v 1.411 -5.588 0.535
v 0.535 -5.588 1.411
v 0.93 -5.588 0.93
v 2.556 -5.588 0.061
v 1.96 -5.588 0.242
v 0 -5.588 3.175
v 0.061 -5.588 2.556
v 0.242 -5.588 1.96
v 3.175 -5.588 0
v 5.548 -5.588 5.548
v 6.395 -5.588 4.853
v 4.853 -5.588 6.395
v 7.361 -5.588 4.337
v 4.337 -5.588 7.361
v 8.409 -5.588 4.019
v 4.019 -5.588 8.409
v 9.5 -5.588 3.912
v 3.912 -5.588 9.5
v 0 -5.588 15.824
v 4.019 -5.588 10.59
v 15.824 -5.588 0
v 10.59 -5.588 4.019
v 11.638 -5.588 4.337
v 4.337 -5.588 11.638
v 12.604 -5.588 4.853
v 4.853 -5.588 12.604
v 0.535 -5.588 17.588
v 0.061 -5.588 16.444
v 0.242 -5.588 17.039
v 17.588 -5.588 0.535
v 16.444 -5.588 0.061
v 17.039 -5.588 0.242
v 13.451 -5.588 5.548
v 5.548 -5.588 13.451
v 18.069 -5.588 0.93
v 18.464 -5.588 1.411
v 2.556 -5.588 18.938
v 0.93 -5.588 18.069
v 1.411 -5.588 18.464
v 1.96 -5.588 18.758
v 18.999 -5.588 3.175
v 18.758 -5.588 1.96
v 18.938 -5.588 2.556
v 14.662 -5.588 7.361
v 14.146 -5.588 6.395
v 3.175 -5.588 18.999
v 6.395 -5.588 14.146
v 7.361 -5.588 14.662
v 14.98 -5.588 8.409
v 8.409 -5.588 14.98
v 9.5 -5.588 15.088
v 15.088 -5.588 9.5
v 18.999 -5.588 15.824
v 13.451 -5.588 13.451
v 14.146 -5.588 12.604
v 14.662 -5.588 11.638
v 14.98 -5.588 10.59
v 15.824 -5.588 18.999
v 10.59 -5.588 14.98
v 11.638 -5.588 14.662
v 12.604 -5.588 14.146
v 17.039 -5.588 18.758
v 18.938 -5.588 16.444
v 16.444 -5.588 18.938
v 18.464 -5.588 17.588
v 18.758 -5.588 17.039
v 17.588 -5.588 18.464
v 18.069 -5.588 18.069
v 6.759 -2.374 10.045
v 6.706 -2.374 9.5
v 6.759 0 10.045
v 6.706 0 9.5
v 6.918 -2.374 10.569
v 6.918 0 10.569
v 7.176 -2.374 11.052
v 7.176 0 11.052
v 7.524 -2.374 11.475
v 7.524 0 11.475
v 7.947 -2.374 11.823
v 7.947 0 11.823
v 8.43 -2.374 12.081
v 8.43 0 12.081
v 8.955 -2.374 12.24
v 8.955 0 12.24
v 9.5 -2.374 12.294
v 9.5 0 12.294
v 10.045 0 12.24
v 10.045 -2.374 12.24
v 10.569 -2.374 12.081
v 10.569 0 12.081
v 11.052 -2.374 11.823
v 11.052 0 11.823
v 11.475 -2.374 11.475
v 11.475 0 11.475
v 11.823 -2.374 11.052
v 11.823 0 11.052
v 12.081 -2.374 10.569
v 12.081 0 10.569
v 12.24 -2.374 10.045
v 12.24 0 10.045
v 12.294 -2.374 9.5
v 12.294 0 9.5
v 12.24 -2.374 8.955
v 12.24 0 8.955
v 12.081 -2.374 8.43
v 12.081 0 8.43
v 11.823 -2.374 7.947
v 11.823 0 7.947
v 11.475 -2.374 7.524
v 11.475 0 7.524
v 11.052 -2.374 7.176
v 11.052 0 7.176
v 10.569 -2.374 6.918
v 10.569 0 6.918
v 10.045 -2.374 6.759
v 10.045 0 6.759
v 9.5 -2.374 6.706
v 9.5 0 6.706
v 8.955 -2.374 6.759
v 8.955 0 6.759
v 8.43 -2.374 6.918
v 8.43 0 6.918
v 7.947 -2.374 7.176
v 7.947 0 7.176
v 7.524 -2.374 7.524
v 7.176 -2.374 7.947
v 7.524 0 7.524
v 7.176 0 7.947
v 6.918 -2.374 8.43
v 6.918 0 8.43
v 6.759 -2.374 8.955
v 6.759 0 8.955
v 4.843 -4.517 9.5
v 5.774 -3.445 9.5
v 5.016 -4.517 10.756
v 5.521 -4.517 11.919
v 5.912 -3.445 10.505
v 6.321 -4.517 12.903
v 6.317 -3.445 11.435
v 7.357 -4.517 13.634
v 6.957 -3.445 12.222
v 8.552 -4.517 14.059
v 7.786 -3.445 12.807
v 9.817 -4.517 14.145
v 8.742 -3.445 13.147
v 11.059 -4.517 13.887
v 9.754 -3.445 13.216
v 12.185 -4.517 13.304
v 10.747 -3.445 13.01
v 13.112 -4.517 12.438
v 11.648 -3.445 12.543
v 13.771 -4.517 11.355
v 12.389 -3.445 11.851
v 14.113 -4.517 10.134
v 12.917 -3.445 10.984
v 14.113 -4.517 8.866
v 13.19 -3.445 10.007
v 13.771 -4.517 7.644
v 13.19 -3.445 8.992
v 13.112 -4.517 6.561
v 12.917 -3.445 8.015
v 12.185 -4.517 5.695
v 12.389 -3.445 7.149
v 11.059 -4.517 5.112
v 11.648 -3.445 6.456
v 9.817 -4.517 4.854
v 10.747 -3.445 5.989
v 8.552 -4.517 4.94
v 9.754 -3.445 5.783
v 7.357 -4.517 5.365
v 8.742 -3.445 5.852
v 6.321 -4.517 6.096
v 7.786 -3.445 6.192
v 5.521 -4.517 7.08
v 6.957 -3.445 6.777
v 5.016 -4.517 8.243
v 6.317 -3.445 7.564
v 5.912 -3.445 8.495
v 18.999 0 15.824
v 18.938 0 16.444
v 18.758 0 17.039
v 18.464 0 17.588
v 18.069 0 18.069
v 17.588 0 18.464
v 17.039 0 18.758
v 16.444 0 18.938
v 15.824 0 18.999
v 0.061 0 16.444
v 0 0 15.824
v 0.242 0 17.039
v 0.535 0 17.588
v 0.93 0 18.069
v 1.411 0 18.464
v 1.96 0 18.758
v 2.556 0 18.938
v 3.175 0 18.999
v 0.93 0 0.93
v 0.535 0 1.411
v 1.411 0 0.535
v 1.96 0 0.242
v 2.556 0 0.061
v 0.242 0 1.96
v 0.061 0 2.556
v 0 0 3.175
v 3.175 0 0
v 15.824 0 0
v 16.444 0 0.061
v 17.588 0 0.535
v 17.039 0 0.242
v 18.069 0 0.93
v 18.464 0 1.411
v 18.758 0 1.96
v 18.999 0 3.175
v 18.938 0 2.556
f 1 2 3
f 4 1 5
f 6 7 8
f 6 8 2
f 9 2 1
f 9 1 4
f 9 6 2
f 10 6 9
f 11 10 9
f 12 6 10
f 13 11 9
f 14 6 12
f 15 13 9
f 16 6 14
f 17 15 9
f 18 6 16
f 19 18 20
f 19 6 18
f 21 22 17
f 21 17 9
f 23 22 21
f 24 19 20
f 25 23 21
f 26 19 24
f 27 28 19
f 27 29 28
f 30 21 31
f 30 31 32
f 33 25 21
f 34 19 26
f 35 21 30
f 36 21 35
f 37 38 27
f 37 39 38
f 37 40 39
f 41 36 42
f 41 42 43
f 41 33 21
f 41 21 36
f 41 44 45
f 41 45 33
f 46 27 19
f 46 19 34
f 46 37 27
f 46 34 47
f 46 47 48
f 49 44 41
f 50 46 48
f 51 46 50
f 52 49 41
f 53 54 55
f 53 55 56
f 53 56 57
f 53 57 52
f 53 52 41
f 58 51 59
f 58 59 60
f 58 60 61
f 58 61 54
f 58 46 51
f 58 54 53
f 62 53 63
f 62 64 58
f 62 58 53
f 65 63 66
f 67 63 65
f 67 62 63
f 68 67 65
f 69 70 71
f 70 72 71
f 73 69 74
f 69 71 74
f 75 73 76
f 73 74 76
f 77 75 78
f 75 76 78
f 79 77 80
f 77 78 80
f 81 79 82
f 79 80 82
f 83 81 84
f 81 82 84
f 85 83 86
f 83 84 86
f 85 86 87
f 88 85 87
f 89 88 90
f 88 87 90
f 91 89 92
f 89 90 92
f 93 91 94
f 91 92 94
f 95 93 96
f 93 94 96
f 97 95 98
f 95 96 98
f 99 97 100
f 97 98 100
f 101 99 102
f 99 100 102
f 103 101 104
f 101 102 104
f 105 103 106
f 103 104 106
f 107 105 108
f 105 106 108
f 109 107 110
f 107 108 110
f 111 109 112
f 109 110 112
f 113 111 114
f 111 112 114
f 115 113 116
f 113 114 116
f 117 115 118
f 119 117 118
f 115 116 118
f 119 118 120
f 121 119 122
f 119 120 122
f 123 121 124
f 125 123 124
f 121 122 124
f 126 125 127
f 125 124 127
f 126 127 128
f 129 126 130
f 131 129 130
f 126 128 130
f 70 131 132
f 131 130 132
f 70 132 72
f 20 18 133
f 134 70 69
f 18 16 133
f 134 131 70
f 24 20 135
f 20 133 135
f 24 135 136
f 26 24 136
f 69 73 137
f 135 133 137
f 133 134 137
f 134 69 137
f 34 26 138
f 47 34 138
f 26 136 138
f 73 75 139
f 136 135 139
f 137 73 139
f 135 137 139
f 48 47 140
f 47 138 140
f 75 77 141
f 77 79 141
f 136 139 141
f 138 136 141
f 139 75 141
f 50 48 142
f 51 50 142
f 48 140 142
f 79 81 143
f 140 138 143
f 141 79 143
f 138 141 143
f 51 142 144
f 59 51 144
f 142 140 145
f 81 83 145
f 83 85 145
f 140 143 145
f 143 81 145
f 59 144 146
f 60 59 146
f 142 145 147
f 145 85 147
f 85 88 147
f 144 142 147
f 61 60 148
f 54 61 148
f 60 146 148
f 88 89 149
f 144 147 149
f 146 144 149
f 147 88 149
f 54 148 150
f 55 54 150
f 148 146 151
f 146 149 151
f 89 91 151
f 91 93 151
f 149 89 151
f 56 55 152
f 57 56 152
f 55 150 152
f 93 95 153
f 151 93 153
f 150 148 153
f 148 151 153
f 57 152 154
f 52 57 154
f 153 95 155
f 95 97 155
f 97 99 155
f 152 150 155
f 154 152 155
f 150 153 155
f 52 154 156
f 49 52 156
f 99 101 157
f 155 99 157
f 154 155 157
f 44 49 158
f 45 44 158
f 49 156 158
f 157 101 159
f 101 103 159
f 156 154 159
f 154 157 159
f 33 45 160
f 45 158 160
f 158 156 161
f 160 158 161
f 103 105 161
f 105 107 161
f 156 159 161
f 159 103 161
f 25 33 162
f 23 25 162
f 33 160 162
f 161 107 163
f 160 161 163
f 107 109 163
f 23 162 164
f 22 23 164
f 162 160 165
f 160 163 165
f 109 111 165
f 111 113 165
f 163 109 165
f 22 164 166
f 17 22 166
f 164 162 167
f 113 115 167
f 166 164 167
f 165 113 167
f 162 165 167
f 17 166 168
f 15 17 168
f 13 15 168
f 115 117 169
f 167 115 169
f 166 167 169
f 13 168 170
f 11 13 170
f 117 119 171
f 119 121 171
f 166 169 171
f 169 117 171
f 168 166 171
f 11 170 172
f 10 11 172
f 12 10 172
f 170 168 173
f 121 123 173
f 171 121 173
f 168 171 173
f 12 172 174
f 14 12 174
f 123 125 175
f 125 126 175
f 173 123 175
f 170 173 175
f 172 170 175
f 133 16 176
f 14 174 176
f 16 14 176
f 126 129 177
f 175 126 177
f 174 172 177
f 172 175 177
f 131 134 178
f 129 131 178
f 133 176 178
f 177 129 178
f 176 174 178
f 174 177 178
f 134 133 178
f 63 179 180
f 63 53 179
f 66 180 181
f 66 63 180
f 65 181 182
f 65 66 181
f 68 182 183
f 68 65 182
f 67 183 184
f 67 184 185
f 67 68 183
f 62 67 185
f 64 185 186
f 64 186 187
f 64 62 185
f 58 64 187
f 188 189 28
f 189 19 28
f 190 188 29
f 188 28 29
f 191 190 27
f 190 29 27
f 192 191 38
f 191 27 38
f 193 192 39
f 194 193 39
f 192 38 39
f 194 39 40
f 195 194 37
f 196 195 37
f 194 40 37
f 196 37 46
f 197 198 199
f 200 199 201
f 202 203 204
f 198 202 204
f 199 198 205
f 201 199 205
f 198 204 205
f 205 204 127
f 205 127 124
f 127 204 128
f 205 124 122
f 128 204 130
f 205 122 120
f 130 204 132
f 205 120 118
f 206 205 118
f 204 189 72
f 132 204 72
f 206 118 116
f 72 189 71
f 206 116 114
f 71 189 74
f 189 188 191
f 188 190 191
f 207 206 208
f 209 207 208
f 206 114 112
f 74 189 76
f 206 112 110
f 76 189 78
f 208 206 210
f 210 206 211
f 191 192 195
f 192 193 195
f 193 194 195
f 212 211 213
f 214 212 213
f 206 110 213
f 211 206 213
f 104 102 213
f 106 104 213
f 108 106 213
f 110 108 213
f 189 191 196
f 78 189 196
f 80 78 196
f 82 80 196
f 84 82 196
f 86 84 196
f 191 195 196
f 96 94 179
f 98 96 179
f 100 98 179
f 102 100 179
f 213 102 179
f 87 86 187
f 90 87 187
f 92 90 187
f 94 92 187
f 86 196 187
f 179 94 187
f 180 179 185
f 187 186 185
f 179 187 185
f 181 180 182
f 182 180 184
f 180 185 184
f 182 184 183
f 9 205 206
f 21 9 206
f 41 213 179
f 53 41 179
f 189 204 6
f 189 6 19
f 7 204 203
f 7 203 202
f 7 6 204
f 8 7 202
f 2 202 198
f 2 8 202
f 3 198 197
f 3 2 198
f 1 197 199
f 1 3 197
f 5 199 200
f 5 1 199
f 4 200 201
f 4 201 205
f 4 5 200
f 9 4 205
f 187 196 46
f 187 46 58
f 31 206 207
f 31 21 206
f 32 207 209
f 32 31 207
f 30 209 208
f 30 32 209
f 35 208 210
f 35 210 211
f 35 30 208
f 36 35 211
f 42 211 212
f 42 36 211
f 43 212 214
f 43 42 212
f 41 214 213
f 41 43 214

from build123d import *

# Parameters (mm, degrees)
F0_W           = 18.9992
F0_H           = 18.9992
F1_DEPTH       = 5.588
F2_R           = 3.175
F4_D           = 5.588
F4_CSINK_D     = 11.176
F4_CSINK_ANGLE = 82


with BuildPart() as f1:
    # F0 (on Front) → F1 (new body)
    with BuildSketch(Plane.XZ):
        with Locations((9.4996, 9.4996)):
            Rectangle(F0_W, F0_H)
    extrude(amount=F1_DEPTH)

    # F2
    f2_edges = [f1.edges().sort_by_distance(p)[0] for p in [
        (0, -2.794, 18.9992),
        (18.9992, -2.794, 18.9992),
        (18.9992, -2.794, 0),
        (0, -2.794, 0),
    ]]
    fillet(f2_edges, radius=F2_R)

    # F4 (through all)
    with Locations(Plane.XZ.offset(5.588)):
        with Locations((9.4996, 9.4996)):
            CounterSinkHole(F4_D / 2, F4_CSINK_D / 2, counter_sink_angle=F4_CSINK_ANGLE)


solid = f1.part
